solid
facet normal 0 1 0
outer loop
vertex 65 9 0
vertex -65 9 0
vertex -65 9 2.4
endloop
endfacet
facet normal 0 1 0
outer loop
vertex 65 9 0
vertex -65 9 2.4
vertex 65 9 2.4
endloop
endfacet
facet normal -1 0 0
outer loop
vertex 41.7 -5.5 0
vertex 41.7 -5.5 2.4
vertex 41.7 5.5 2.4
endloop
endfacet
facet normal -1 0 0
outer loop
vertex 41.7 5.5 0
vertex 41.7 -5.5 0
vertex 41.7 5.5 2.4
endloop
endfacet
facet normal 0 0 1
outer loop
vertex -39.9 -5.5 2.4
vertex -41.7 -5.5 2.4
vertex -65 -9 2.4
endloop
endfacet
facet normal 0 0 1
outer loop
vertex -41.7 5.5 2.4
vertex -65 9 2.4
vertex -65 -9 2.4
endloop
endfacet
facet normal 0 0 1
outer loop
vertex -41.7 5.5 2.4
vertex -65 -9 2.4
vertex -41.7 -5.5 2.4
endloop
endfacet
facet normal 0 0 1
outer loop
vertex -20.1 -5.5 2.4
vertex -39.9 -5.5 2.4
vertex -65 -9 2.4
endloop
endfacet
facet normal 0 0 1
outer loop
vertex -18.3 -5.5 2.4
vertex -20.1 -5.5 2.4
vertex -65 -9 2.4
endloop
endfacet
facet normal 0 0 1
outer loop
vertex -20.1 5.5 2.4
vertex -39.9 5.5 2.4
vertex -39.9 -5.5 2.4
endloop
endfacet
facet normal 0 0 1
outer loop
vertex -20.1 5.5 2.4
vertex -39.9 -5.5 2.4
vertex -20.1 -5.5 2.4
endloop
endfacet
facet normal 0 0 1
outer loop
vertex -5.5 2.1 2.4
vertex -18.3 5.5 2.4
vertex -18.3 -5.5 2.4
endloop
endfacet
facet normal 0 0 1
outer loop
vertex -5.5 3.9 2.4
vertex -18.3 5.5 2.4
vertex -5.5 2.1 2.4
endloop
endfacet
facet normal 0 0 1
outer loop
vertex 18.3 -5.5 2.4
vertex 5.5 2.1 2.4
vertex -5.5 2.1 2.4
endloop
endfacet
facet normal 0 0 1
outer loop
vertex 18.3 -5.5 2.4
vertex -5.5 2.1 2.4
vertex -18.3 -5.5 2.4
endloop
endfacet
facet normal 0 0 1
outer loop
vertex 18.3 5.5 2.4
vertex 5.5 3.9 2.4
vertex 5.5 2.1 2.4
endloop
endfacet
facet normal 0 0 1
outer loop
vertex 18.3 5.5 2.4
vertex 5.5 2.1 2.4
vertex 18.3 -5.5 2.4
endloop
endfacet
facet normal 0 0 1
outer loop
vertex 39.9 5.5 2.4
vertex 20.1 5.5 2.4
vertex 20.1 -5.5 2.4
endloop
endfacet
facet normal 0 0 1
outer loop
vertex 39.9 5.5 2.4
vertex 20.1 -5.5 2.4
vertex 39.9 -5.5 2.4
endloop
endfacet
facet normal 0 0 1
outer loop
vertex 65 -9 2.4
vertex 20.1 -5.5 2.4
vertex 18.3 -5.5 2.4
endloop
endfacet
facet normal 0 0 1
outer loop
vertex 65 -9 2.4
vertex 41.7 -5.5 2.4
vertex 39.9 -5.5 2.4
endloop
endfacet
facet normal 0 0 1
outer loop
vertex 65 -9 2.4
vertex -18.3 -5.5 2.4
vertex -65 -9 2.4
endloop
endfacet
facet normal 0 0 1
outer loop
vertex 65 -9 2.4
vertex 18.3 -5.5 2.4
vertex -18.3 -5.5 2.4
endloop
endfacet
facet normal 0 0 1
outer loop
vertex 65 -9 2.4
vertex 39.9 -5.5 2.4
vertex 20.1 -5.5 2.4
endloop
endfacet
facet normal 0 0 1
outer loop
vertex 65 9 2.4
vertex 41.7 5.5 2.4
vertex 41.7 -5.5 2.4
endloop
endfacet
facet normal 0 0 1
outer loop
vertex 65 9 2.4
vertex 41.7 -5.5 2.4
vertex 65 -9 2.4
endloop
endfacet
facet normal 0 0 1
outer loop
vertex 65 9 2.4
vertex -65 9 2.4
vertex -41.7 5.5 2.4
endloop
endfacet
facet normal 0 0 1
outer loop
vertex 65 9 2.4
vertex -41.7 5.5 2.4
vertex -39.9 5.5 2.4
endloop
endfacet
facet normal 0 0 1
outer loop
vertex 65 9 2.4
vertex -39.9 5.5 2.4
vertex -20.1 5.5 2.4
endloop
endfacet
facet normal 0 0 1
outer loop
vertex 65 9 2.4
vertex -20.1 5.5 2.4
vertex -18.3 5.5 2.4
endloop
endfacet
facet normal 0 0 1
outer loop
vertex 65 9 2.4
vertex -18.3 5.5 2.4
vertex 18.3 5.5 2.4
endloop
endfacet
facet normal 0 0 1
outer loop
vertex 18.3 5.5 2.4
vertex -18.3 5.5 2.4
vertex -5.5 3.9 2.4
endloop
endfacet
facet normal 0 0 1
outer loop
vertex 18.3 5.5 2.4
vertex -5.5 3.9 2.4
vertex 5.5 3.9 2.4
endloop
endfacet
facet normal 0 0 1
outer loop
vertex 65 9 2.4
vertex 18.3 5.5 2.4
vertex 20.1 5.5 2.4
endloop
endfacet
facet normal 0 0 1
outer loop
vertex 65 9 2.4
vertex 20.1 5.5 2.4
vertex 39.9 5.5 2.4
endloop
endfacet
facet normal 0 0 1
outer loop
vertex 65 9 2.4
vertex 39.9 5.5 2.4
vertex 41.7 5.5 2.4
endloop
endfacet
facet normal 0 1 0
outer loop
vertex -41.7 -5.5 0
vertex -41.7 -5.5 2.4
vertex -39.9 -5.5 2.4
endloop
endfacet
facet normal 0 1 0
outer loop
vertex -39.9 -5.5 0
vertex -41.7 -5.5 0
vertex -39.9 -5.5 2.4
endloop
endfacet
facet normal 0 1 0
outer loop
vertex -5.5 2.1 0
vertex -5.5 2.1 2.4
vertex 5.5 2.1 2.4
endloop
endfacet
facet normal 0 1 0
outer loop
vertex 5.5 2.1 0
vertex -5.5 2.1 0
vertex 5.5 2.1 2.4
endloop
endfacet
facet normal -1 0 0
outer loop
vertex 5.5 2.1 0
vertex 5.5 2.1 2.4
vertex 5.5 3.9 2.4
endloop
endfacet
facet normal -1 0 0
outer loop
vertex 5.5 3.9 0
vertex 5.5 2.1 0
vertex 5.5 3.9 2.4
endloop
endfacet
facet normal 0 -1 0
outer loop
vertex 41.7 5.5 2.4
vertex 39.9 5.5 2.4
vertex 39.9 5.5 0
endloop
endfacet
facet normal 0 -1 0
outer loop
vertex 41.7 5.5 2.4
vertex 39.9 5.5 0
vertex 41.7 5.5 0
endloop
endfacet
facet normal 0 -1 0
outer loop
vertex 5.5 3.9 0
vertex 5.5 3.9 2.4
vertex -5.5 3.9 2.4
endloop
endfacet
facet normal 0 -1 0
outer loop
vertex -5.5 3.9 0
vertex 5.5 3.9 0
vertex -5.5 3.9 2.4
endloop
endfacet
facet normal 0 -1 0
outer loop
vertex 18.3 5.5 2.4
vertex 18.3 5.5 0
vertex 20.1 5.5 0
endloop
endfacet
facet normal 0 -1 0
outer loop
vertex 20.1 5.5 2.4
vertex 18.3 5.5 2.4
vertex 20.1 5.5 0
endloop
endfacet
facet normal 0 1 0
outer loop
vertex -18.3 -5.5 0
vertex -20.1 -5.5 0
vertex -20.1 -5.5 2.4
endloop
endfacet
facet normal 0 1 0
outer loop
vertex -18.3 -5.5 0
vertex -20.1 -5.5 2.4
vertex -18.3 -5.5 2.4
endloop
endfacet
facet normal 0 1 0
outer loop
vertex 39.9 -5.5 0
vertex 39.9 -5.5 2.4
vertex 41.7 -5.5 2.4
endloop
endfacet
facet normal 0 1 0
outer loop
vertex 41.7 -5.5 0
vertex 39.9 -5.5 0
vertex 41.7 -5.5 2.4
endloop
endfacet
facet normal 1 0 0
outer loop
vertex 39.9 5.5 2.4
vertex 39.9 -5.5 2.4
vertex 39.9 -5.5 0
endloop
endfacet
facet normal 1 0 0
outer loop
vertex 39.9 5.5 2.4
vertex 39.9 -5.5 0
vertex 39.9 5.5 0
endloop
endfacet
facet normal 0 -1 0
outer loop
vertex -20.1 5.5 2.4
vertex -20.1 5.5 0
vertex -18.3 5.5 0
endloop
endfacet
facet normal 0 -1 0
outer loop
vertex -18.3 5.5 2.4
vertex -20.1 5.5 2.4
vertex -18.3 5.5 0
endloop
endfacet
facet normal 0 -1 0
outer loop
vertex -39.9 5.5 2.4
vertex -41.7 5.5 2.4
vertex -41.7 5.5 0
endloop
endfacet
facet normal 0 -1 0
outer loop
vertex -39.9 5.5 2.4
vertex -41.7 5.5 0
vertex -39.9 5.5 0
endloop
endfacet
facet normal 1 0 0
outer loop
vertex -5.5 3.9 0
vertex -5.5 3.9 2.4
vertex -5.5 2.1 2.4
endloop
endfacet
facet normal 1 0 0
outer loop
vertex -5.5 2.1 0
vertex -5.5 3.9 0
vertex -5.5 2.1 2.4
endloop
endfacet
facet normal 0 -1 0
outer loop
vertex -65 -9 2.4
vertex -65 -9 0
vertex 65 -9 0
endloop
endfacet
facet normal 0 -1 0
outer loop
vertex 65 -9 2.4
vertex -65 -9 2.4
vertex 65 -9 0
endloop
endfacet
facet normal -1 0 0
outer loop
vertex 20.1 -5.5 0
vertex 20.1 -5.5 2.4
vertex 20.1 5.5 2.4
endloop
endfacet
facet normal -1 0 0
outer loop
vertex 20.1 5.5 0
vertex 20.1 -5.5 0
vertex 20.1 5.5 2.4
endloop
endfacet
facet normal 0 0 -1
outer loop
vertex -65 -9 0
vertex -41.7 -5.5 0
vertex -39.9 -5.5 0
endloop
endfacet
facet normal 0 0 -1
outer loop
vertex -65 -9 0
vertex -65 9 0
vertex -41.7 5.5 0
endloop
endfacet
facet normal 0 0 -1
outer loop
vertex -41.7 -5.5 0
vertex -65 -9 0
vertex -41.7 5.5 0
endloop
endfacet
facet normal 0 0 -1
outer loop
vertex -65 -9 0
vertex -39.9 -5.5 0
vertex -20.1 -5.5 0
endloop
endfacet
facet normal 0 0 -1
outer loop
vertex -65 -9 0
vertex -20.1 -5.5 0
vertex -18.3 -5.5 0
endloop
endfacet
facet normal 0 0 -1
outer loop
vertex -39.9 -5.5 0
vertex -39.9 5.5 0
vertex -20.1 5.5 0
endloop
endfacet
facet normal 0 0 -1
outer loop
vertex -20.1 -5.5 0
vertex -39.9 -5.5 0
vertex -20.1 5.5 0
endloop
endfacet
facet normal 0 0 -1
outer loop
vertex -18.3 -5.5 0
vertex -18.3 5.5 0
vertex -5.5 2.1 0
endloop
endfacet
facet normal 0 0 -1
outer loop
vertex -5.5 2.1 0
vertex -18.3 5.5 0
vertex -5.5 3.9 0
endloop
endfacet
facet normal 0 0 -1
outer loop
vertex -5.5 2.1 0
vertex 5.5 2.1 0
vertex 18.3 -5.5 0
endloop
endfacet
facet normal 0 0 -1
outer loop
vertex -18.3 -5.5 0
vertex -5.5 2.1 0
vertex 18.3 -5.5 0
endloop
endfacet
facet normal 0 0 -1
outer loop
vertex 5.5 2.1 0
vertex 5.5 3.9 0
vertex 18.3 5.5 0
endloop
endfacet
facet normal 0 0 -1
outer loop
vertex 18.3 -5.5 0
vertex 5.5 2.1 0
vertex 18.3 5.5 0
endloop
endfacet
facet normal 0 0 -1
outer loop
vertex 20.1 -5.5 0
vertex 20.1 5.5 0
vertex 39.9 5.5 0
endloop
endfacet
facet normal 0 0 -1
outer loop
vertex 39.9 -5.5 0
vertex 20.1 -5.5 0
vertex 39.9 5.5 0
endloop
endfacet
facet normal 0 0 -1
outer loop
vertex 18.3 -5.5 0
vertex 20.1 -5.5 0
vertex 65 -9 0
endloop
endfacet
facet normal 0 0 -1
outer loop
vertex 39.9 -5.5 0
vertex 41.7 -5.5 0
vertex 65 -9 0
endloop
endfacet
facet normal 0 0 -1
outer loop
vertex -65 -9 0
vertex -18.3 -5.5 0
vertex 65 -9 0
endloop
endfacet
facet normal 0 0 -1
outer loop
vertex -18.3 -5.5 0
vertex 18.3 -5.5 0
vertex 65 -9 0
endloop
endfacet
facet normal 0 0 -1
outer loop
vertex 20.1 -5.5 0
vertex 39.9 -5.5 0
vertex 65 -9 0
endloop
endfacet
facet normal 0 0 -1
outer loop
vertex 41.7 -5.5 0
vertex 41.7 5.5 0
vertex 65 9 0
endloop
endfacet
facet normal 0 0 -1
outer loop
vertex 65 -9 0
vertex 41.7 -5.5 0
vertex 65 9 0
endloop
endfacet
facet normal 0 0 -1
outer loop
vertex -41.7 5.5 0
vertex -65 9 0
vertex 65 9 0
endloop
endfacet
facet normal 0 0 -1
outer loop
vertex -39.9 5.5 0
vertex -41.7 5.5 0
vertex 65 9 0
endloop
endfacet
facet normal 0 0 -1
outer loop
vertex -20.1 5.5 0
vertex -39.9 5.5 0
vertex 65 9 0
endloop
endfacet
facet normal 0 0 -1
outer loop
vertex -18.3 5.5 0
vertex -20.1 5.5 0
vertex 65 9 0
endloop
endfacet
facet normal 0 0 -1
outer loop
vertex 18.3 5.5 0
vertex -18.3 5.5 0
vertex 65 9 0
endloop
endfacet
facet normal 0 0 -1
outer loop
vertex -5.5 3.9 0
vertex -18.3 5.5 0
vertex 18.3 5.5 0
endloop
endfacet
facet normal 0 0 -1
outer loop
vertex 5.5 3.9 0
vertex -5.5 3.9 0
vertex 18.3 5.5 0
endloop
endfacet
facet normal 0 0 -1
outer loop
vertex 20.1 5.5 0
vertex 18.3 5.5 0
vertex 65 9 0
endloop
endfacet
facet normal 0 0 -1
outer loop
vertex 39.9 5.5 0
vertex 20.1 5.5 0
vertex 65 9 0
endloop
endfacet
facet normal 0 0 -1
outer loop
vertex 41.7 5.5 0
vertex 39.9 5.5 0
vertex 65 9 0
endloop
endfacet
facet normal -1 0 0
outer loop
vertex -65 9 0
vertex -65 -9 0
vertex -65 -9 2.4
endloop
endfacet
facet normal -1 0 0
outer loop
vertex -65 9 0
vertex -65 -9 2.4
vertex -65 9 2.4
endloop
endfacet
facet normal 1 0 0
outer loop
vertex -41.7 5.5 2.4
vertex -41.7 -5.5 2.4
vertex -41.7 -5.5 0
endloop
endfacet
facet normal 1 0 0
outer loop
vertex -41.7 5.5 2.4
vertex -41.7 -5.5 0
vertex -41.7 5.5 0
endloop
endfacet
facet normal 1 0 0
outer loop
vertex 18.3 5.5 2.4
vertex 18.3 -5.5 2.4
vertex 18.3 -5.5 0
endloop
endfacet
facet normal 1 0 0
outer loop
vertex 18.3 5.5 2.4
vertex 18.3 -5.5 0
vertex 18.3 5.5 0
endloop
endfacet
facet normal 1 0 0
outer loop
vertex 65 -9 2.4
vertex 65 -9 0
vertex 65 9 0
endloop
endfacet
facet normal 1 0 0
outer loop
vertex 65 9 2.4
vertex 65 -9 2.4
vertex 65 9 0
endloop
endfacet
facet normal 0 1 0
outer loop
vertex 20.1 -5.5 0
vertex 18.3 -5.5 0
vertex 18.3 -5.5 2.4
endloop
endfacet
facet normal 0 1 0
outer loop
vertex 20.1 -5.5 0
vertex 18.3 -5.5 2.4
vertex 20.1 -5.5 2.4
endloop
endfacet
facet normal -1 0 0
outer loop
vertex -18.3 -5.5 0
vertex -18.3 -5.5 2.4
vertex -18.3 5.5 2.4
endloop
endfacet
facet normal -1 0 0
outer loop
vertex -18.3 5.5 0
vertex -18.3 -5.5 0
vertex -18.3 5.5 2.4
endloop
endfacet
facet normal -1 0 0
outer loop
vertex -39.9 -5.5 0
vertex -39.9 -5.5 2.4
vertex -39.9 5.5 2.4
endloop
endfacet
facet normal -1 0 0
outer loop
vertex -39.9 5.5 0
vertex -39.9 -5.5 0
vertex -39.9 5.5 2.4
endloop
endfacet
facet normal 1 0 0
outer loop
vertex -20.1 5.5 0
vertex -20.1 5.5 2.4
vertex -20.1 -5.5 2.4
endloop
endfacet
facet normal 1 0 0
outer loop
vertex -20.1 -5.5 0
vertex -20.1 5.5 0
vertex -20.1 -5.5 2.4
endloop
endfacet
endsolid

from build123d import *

# Parameters (mm, degrees)
SKETCH2_W           = 130
SKETCH2_H           = 18
BOSS_EXTRUDE1_DEPTH = 2.4
SKETCH3_W           = 1.8
SKETCH3_H           = 11
SKETCH3_H_2         = 5.5
CUT_EXTRUDE1_DEPTH  = 11


with BuildPart() as part:
    # Sketch2 → Boss-Extrude1 (new body)
    with BuildSketch(Plane.XY):
        Rectangle(SKETCH2_W, SKETCH2_H)
    extrude(amount=BOSS_EXTRUDE1_DEPTH)

    # Sketch3 → Cut-Extrude1 (cut)
    with BuildSketch(Plane.XY.offset(2.4)):
        with Locations((-40.8, 0)):
            Rectangle(SKETCH3_W, SKETCH3_H)
        with Locations((-19.2, 2.75)):
            Rectangle(SKETCH3_W, SKETCH3_H_2)
        with Locations((-19.2, -2.75)):
            Rectangle(SKETCH3_W, SKETCH3_H_2)
        with Locations((19.2, 0)):
            Rectangle(SKETCH3_W, SKETCH3_H)
        with Locations((40.8, 0)):
            Rectangle(SKETCH3_W, SKETCH3_H)
        Polygon((0, 3), (0, 3.9), (-5.5, 3.9), (-5.5, 2.1), (0, 2.1), align=None)
        Polygon((5.5, 3.9), (0, 3.9), (0, 3), (0, 2.1), (5.5, 2.1), align=None)
    extrude(amount=-CUT_EXTRUDE1_DEPTH, mode=Mode.SUBTRACT)


solid = part.part
